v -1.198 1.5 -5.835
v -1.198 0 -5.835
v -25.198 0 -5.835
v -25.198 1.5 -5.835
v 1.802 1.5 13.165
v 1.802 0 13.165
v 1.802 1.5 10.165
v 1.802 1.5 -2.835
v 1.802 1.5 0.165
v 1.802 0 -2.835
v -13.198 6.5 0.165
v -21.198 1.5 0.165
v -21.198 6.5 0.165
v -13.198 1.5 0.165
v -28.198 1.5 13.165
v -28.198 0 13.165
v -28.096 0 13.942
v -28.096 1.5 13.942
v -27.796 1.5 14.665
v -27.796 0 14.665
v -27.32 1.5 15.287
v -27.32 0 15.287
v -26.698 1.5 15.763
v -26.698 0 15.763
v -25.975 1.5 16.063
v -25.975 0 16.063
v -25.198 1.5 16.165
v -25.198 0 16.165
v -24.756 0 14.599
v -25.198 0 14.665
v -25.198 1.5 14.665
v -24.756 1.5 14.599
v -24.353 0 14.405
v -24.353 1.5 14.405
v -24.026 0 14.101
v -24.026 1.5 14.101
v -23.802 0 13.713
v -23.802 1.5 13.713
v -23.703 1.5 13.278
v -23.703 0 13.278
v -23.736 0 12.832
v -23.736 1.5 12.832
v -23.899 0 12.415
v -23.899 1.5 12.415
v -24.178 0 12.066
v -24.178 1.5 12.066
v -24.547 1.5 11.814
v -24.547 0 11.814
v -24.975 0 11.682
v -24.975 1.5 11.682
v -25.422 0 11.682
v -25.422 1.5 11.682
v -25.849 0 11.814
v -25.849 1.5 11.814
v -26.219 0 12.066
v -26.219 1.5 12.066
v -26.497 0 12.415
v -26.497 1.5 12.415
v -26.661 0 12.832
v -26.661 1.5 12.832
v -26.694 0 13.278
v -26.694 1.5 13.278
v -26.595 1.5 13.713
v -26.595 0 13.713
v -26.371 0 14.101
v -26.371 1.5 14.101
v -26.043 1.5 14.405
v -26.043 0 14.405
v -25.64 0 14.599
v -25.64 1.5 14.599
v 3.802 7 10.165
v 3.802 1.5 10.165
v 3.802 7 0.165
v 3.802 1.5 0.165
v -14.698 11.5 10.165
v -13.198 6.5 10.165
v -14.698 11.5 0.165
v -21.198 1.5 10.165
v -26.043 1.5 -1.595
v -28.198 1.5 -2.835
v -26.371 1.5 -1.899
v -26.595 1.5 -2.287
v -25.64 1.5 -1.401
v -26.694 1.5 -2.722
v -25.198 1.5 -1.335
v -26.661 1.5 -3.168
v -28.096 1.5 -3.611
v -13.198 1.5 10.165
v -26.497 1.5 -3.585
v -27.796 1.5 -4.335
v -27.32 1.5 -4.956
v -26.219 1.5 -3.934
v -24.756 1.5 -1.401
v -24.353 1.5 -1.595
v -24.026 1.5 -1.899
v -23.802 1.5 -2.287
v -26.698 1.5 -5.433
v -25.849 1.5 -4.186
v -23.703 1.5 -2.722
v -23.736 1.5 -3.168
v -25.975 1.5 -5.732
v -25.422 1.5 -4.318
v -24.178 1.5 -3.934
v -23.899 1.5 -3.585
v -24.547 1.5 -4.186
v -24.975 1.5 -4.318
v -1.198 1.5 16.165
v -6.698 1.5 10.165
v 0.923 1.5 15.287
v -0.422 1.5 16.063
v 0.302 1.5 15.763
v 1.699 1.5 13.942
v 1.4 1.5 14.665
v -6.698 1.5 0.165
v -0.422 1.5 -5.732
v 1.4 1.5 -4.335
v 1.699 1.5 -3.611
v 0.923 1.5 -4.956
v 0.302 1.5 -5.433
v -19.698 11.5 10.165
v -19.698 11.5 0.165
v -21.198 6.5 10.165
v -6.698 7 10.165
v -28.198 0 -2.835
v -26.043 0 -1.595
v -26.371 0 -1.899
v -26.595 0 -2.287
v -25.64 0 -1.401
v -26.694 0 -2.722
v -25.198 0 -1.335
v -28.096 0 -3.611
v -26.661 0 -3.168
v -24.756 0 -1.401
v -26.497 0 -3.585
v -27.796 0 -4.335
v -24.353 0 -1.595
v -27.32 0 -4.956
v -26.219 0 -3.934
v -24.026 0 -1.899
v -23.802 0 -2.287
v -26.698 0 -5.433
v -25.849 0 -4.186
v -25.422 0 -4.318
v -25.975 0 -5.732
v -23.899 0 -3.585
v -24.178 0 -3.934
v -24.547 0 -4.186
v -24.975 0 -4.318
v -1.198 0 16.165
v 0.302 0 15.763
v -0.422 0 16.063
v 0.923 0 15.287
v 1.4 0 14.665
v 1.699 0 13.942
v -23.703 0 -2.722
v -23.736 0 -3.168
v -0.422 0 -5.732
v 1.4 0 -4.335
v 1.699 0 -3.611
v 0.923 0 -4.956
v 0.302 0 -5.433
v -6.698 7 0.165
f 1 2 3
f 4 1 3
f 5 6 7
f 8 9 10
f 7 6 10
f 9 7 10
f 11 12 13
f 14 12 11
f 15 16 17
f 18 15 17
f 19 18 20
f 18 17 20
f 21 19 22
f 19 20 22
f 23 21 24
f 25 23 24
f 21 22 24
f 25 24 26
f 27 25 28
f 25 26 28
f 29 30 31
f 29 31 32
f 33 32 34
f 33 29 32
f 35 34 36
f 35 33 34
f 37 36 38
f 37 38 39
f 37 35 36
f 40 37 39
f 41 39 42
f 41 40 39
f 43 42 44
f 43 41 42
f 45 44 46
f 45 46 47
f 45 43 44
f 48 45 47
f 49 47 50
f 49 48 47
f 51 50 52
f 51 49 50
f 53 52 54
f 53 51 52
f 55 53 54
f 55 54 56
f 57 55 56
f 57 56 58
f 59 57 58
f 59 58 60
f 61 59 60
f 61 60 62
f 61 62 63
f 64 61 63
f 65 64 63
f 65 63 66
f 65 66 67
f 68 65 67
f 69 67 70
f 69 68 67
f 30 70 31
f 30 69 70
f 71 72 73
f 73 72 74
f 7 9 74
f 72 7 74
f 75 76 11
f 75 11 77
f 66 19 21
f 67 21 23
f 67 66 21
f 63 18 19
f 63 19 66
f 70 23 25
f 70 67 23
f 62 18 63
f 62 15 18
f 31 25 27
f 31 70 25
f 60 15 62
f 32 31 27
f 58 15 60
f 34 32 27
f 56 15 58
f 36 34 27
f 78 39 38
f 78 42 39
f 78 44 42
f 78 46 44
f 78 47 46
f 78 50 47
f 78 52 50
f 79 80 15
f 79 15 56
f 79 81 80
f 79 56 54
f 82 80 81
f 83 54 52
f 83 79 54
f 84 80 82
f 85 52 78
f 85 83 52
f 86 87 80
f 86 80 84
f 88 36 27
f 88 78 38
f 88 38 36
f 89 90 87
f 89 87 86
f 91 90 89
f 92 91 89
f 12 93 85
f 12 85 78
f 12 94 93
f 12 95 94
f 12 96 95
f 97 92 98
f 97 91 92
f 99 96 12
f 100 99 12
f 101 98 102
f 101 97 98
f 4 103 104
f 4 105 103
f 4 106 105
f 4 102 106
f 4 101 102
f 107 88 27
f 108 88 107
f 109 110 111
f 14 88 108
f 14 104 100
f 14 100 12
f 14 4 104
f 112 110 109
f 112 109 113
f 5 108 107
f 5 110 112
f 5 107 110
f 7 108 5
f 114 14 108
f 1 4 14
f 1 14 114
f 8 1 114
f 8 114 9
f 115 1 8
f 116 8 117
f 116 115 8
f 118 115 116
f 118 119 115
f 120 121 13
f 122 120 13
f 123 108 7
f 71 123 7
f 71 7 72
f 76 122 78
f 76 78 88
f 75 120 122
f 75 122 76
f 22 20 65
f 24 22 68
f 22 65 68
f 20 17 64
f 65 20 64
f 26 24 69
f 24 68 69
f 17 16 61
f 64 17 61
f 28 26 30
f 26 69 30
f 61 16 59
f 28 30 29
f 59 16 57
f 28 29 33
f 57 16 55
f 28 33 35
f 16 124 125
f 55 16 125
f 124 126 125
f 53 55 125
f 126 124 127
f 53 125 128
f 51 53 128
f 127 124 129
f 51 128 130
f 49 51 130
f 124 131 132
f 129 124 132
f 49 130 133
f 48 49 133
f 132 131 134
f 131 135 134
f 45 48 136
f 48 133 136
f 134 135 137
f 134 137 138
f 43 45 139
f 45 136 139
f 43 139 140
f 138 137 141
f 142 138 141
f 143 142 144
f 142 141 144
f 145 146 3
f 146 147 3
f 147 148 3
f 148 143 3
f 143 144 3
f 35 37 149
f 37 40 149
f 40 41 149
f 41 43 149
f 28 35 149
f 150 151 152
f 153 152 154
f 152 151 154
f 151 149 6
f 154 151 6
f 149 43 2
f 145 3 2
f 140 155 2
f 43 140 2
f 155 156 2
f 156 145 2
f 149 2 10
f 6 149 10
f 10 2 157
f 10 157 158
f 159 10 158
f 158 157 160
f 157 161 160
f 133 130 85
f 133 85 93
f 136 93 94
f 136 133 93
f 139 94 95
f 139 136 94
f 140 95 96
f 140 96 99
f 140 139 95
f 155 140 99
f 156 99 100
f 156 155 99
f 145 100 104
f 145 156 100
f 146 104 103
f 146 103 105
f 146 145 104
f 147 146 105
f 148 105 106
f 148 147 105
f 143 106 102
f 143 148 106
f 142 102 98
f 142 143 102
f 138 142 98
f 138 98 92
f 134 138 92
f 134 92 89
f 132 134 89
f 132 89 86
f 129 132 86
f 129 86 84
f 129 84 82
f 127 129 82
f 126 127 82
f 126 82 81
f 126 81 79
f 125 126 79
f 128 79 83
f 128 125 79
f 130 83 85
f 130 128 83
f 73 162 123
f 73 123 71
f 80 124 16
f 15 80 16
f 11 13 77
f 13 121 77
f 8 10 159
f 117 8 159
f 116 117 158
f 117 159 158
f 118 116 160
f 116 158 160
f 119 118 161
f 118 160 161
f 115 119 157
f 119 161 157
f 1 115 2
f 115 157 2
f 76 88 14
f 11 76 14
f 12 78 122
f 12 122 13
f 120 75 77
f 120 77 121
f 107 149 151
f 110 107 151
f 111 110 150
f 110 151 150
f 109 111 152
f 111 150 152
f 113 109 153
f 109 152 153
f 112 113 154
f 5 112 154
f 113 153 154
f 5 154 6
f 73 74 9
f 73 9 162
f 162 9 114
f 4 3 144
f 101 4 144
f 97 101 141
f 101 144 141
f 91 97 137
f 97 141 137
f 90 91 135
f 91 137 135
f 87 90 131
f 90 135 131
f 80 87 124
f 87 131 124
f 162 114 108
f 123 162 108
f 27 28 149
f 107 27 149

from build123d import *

# Parameters (mm, degrees)
SKETCH_1_R      = 1.5
EXTRUDE_1_DEPTH = 1.5
EXTRUDE_2_DEPTH = 5.5
SKETCH_3_W      = 8
SKETCH_3_H      = 10
EXTRUDE_3_DEPTH = 5
EXTRUDE_4_DEPTH = 10.000003


with BuildPart() as part:
    # Эскиз1 → Бобышка-Вытянуть1 (new body)
    with BuildSketch(Plane(origin=(0, 0, 0), x_dir=(1, 0, 0), z_dir=(0, 1, 0))):
        with BuildLine():
            Line((-28.198313686, 2.834587413), (-28.198313686, -13.165412587))
            ThreePointArc((-28.198313686, -13.165412587), (-27.31963403, -15.286732931), (-25.198313686, -16.165412587))
            Line((-25.198313686, -16.165412587), (-1.198313686, -16.165412587))
            ThreePointArc((-1.198313686, -16.165412587), (0.923006657, -15.286732931), (1.801686314, -13.165412587))
            Line((1.801686314, -13.165412587), (1.801686314, 2.834587413))
            ThreePointArc((1.801686314, 2.834587413), (0.923006657, 4.955907756), (-1.198313686, 5.834587413))
            Line((-1.198313686, 5.834587413), (-25.198313686, 5.834587413))
            ThreePointArc((-25.198313686, 5.834587413), (-27.31963403, 4.955907756), (-28.198313686, 2.834587413))
        make_face()
        with Locations(Location((-25.198313686, -13.165412587, 0), (0, 0, 270))):
            Circle(SKETCH_1_R, mode=Mode.SUBTRACT)
        with Locations(Location((-25.198313686, 2.834587413, 0), (0, 0, 270))):
            Circle(SKETCH_1_R, mode=Mode.SUBTRACT)
    extrude(amount=EXTRUDE_1_DEPTH)

    # Эскиз2 → Бобышка-Вытянуть2 (add)
    with BuildSketch(Plane(origin=(0, 1.5, 0), x_dir=(1, 0, 0), z_dir=(0, 1, 0))):
        Polygon((1.801686314, -0.165412587), (-6.698313686, -0.165412587), (-6.698313686, -10.165412587), (1.801686314, -10.165412587), (3.801686314, -10.165412587), (3.801686314, -0.165412587), align=None)
    extrude(amount=EXTRUDE_2_DEPTH)

    # Эскиз3 → Бобышка-Вытянуть3 (add)
    with BuildSketch(Plane(origin=(0, 1.5, 0), x_dir=(1, 0, 0), z_dir=(0, 1, 0))):
        with Locations((-17.198313686, -5.165412587)):
            Rectangle(SKETCH_3_W, SKETCH_3_H)
    extrude(amount=EXTRUDE_3_DEPTH)

    # Эскиз4 → Бобышка-Вытянуть4 (add)
    with BuildSketch(Plane.XY.offset(10.165412587)):
        Polygon((-21.198313686, 6.5), (-17.198313686, 6.5), (-17.198313686, 11.5), (-19.698313686, 11.5), align=None)
        Polygon((-17.198313686, 11.5), (-17.198313686, 6.5), (-13.198313686, 6.5), (-14.698313686, 11.5), align=None)
    extrude(amount=-EXTRUDE_4_DEPTH)


solid = part.part
